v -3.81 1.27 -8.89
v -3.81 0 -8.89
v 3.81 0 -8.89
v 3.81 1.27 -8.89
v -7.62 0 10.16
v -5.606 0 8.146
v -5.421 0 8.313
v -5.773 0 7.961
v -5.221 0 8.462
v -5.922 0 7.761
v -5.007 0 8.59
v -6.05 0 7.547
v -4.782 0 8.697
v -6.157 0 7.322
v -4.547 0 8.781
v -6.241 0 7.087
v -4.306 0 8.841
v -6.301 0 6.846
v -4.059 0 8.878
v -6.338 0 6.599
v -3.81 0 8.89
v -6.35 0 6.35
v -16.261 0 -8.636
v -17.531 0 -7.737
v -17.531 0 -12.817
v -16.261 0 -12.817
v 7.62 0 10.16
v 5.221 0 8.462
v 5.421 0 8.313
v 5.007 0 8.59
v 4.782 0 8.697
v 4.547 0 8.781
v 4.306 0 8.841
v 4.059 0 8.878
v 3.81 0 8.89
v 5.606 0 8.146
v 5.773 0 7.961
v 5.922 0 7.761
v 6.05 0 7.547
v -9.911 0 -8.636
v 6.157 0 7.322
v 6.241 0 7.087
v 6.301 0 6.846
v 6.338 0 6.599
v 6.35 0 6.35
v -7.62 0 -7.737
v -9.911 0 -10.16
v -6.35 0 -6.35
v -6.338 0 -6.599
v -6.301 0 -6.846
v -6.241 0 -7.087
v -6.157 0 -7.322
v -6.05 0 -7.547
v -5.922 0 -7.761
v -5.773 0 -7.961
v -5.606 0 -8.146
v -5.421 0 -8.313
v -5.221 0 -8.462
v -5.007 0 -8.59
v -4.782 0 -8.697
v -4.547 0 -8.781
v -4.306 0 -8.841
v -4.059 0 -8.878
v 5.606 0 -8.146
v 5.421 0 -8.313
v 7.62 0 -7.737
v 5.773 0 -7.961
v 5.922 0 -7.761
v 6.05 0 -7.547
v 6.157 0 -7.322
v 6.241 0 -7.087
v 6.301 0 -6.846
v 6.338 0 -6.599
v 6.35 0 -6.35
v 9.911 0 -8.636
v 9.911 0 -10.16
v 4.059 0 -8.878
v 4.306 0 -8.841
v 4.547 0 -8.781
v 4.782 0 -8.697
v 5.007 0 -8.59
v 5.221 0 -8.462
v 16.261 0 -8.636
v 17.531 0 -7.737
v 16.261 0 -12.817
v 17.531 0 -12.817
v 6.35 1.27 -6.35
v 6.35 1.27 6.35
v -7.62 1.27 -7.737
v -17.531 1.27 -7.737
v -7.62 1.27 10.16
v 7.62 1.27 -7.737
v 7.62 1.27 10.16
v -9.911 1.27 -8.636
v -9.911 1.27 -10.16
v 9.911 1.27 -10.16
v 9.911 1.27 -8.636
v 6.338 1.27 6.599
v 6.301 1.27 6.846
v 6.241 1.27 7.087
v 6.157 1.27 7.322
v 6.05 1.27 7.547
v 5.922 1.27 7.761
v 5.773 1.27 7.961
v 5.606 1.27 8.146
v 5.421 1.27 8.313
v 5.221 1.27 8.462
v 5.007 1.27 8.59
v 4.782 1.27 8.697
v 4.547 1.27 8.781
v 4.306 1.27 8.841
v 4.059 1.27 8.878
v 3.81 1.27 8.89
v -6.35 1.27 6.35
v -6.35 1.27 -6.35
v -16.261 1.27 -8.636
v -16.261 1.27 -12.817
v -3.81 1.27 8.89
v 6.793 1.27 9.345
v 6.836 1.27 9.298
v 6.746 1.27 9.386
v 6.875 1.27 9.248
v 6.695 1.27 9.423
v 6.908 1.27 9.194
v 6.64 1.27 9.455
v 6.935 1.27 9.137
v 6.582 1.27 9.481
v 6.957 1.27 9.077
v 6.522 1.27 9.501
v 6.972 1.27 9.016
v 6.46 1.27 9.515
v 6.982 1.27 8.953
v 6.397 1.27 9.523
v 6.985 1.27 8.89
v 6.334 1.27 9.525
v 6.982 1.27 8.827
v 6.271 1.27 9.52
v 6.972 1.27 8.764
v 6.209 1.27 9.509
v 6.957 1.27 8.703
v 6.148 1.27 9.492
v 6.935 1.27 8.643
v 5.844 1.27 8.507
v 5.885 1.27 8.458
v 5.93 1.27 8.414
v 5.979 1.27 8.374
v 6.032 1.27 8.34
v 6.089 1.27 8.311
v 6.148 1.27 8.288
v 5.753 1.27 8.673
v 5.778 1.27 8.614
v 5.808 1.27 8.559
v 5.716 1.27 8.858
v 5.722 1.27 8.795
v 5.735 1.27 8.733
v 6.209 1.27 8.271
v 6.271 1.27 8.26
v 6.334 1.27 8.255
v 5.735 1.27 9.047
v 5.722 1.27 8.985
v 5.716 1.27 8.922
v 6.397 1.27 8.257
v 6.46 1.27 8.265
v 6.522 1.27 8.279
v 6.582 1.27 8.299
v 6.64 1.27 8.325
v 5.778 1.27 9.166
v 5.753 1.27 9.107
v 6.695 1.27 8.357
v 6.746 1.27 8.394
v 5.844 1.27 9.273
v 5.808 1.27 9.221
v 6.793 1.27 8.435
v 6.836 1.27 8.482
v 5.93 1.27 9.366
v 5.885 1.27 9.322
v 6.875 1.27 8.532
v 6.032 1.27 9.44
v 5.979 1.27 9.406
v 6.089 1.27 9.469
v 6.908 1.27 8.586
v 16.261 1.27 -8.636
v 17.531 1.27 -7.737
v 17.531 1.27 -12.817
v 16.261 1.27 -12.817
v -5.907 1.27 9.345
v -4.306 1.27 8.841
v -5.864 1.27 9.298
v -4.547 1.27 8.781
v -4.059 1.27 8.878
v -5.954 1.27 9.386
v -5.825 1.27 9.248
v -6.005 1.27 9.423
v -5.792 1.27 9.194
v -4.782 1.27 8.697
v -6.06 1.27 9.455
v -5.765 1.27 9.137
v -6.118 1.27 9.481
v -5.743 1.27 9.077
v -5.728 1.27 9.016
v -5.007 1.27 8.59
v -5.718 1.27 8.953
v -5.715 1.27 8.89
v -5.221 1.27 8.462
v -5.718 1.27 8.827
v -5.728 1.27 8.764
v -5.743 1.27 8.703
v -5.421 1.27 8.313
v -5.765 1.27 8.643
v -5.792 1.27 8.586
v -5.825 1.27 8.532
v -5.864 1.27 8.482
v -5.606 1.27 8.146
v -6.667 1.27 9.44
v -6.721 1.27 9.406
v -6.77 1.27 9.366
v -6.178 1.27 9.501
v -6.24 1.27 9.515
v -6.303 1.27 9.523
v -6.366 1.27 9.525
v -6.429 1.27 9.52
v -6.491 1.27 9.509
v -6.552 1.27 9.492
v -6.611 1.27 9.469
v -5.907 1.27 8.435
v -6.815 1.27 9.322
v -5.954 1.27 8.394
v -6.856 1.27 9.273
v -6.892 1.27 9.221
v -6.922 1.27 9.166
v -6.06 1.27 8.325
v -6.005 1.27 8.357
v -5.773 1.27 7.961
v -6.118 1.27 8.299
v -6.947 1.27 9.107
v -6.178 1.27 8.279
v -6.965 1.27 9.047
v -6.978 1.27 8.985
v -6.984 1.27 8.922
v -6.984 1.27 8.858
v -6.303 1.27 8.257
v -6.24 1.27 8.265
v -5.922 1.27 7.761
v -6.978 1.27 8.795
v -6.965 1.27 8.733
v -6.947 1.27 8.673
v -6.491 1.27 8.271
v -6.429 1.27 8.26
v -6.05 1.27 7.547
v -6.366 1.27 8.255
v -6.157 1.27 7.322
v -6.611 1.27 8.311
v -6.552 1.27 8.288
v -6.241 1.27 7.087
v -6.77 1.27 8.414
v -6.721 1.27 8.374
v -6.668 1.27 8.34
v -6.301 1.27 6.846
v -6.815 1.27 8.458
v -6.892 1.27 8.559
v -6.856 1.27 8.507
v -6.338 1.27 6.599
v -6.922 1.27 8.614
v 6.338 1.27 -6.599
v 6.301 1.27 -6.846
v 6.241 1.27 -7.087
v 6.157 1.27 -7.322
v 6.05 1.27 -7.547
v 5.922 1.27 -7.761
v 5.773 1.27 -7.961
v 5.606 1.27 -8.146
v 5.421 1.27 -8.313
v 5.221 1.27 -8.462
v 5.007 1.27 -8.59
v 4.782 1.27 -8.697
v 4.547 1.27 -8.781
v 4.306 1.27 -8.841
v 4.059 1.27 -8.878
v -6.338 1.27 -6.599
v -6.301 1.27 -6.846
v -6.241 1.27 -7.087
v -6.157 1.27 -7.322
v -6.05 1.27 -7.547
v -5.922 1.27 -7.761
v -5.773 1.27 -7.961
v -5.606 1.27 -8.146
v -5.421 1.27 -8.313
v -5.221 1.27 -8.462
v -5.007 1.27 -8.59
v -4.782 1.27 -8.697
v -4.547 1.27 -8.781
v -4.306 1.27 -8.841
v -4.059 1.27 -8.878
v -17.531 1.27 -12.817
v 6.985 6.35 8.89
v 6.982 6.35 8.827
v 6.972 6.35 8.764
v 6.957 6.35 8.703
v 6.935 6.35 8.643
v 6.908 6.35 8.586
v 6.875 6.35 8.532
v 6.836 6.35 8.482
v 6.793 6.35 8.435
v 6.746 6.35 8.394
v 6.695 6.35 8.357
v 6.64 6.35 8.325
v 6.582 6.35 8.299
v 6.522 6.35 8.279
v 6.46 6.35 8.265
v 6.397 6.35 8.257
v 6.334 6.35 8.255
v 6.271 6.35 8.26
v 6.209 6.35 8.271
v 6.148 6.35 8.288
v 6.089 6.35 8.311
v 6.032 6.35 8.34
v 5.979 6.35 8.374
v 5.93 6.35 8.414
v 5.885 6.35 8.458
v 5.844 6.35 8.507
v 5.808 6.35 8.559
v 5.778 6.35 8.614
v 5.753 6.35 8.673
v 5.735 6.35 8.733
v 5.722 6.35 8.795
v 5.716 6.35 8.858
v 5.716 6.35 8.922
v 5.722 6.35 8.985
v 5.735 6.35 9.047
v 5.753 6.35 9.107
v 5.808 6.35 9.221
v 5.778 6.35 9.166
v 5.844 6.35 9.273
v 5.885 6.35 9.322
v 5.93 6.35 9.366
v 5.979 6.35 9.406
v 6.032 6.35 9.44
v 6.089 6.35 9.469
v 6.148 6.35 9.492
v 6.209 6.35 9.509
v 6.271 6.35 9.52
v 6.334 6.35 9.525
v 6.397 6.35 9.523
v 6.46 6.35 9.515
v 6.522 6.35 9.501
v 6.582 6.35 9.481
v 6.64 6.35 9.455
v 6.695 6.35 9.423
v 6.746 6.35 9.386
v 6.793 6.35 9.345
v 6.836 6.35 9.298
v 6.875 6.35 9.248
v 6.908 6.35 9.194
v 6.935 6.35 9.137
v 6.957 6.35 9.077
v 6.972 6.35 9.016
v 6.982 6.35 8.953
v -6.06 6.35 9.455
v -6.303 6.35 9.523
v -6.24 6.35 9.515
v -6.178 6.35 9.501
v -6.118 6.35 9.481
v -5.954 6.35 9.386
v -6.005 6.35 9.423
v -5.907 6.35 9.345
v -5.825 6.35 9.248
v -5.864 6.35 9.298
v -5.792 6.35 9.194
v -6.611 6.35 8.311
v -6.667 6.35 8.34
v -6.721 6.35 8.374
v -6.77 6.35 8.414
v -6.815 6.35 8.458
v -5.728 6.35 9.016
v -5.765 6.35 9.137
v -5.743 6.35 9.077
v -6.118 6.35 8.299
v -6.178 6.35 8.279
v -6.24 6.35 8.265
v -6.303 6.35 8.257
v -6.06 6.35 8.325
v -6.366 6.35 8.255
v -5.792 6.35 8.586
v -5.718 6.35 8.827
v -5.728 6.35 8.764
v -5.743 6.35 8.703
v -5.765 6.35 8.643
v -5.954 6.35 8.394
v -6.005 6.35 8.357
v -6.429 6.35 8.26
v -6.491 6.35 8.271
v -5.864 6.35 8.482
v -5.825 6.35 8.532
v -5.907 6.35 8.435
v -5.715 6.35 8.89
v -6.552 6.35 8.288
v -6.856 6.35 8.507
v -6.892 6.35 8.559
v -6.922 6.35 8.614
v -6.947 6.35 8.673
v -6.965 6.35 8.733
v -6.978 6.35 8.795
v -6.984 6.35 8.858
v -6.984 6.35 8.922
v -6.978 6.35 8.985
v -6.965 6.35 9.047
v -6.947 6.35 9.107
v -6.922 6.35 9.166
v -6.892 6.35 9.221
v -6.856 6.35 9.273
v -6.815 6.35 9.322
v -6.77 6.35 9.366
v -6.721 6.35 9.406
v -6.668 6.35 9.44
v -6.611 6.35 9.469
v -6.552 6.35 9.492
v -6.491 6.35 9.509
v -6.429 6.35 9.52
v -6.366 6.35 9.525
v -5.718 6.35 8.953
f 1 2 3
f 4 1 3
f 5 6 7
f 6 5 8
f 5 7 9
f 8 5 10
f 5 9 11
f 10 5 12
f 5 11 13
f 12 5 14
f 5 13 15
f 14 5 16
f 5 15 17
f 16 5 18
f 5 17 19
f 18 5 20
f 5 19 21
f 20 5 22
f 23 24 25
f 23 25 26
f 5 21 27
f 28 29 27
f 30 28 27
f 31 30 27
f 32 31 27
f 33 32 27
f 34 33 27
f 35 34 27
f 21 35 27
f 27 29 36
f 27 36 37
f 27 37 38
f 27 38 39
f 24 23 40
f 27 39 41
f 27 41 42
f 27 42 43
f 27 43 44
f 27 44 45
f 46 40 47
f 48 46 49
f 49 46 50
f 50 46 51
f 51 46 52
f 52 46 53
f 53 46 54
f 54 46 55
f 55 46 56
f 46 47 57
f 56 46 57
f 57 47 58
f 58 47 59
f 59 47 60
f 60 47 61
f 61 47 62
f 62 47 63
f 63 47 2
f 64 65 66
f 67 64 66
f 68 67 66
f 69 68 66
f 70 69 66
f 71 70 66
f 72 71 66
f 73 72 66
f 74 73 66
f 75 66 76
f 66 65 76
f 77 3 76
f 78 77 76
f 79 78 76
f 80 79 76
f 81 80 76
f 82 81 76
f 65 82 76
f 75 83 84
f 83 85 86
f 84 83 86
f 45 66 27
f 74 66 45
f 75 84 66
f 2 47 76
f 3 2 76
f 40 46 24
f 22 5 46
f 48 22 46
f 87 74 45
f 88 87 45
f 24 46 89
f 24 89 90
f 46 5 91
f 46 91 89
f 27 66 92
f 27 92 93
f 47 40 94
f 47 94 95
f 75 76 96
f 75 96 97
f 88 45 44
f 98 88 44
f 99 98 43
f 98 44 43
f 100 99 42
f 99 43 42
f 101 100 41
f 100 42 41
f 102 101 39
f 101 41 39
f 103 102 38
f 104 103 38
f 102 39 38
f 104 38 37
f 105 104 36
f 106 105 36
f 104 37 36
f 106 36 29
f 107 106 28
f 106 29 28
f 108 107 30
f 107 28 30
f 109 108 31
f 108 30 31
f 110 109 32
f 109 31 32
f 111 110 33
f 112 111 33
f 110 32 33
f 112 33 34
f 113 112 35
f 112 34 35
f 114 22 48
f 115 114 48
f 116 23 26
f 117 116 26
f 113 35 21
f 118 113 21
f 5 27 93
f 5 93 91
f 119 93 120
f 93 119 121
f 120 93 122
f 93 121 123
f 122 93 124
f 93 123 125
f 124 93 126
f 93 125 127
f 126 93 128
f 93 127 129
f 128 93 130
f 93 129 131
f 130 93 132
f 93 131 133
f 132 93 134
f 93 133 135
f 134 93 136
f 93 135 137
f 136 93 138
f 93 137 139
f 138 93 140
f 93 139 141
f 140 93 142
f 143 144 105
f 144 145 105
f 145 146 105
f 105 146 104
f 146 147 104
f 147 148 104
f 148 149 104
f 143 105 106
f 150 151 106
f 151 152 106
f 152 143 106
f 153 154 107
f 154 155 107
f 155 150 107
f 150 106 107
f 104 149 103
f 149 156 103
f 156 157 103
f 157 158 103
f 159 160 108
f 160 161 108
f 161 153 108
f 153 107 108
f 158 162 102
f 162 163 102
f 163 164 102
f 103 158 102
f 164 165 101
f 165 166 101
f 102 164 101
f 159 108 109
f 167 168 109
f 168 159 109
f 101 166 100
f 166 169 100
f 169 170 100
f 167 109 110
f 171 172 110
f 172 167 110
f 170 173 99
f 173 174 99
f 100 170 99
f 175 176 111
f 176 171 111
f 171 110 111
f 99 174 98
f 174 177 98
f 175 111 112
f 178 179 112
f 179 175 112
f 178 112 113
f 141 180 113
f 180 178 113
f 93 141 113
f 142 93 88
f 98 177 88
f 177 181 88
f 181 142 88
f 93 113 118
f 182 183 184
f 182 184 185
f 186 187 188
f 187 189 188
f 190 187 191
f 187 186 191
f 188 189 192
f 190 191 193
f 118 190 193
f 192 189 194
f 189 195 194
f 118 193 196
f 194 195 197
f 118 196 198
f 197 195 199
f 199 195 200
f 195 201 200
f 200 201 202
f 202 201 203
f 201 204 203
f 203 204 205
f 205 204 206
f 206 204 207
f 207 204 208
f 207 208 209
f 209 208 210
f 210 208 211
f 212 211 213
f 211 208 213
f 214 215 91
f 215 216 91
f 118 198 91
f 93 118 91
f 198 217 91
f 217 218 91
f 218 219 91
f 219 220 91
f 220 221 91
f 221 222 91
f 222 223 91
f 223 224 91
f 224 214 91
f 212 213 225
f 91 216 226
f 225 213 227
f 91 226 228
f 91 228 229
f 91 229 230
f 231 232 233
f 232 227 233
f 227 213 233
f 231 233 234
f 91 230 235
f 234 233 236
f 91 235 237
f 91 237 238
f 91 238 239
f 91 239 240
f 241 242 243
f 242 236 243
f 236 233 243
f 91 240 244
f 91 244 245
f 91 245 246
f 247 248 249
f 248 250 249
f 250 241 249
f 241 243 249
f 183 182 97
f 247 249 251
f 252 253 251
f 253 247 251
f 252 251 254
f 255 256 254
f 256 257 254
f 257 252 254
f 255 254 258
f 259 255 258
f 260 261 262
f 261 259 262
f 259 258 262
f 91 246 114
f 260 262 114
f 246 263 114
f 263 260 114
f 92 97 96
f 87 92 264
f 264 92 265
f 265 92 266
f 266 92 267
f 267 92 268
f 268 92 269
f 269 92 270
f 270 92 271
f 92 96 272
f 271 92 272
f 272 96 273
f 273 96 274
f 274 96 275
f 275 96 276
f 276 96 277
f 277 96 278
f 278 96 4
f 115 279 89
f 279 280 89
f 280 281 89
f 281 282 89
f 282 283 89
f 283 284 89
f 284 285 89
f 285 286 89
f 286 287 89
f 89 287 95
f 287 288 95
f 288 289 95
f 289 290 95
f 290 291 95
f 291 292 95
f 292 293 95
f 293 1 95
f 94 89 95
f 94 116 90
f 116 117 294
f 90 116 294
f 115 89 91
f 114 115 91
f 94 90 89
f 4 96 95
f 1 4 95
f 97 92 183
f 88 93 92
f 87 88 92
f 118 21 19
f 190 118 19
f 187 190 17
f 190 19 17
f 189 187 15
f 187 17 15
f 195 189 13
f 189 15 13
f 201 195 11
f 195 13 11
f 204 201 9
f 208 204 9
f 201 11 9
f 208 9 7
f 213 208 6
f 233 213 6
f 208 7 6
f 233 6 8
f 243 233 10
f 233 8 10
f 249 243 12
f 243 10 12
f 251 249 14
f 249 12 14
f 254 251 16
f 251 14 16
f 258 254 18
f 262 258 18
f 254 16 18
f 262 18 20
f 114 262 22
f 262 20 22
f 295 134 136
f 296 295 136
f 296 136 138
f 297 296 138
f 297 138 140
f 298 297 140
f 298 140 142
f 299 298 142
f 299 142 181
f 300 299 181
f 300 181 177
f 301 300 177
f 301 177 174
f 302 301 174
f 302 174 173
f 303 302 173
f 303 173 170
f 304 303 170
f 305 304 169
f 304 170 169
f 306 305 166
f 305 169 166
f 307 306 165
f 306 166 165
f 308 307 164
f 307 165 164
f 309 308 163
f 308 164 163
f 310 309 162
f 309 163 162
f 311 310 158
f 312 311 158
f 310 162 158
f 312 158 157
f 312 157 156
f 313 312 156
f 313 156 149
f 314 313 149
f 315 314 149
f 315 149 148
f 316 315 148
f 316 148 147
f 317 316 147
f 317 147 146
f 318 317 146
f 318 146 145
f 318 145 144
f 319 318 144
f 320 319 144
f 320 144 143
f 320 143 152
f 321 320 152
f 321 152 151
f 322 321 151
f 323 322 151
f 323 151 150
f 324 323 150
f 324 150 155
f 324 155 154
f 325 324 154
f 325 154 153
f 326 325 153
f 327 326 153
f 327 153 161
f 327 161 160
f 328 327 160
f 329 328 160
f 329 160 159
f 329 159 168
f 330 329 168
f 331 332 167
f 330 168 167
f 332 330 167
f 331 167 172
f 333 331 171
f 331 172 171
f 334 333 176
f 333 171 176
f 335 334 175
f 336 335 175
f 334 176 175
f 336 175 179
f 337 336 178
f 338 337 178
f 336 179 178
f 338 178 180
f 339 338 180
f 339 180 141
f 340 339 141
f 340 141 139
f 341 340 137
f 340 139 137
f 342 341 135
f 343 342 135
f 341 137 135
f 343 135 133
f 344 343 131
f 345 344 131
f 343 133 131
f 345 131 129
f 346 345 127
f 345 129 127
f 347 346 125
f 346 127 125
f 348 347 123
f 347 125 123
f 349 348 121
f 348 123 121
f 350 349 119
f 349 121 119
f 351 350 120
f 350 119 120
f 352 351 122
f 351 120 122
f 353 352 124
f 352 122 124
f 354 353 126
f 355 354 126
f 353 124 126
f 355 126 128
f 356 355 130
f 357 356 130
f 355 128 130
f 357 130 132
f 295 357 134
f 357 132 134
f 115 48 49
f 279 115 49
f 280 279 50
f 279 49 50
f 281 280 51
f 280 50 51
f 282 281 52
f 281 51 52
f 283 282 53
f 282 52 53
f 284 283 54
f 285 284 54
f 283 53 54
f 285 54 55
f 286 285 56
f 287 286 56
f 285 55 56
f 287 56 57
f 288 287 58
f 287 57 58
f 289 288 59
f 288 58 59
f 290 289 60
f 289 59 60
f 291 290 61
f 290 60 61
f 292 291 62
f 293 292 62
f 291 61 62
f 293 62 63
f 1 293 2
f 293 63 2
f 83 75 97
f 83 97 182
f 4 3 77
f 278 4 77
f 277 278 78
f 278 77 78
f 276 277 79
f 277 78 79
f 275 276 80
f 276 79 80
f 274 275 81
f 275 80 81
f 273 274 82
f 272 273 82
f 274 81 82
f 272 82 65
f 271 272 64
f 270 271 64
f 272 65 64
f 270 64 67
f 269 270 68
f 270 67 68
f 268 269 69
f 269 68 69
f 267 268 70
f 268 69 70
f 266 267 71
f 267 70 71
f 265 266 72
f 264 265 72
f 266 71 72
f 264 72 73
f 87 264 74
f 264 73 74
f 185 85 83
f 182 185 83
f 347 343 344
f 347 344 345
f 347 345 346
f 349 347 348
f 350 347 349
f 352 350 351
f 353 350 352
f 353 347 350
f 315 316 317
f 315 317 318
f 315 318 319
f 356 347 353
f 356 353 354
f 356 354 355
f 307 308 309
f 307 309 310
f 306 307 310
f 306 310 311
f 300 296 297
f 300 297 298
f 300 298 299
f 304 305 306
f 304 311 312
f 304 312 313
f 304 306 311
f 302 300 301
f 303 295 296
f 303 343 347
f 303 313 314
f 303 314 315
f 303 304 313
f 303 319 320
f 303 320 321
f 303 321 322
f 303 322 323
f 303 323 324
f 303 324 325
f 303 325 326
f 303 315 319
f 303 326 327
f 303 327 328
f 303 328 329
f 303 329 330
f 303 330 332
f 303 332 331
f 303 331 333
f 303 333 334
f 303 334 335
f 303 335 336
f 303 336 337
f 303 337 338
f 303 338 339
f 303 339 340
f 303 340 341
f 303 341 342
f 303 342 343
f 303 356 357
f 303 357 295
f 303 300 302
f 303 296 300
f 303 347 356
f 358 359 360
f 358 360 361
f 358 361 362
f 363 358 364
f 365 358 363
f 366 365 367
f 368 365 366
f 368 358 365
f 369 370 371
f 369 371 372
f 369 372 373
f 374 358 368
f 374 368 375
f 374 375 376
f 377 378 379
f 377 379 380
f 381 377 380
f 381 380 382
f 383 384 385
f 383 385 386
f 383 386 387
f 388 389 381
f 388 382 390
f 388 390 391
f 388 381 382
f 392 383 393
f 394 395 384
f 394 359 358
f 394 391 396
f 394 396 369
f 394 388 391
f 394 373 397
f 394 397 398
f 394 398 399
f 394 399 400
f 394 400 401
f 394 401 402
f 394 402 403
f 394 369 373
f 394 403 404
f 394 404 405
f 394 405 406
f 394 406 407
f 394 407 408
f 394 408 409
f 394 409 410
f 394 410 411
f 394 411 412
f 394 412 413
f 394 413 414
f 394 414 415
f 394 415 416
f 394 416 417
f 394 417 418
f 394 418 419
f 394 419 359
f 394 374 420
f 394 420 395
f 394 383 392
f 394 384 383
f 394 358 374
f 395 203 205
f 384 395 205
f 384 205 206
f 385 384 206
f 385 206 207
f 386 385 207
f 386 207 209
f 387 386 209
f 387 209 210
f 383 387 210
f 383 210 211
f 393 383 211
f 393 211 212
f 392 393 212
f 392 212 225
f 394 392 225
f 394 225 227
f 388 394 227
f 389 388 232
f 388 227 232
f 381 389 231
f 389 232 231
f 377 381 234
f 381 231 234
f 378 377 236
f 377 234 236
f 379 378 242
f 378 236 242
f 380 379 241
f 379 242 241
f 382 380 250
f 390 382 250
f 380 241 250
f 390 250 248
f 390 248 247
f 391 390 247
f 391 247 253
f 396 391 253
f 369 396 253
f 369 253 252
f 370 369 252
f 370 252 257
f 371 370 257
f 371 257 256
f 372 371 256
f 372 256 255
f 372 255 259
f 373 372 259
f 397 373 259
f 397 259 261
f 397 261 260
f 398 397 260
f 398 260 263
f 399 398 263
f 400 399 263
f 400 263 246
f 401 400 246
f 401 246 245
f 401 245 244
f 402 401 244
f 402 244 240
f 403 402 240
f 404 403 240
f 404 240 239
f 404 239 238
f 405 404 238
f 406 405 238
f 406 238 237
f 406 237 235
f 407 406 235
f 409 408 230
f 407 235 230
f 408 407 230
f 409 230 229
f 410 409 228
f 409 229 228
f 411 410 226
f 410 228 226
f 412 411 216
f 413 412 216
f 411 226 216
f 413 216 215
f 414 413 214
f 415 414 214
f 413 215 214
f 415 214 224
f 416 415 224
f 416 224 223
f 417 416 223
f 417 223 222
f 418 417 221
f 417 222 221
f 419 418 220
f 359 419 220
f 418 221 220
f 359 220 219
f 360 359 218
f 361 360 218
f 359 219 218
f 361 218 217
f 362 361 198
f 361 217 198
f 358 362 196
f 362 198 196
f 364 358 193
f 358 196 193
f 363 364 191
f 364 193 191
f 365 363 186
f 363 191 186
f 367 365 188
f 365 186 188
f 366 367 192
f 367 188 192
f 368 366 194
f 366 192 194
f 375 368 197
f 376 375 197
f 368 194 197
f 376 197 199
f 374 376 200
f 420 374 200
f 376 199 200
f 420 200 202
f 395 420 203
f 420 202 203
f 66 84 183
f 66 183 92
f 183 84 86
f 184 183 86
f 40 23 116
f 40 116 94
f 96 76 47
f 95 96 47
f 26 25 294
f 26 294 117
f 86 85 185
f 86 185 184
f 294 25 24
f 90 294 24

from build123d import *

# Parameters (mm, degrees)
BOSS_EXTRUDE2_DEPTH     = 1.27
SKETCH3_R               = 0.635
BOSS_EXTRUDE3_DEPTH     = 6.35
CUT_EXTRUDE1_DEPTH      = 6.35
CUT_EXTRUDE1_DEPTH_BACK = 6.35


with BuildPart() as part:
    # Sketch1 → Boss-Extrude2 (new body)
    with BuildSketch(Plane(origin=(0, 0, 0), x_dir=(1, 0, 0), z_dir=(0, 1, 0))):
        Polygon((7.62, -10.16), (-7.62, -10.16), (-7.62, 7.736503278), (-17.531075881, 7.736503278), (-17.531075881, 10.276503278), (-17.531075881, 12.816503278), (-16.261075881, 12.816503278), (-16.261075881, 10.16), (-16.261075881, 8.636), (-9.911075881, 8.636), (-9.911075881, 10.16), (-7.62, 10.16), (7.62, 10.16), (9.911075881, 10.16), (9.911075881, 8.636), (16.261075881, 8.636), (16.261075881, 10.16), (16.261075881, 12.816503278), (17.531075881, 12.816503278), (17.531075881, 10.276503278), (17.531075881, 7.736503278), (7.62, 7.736503278), align=None)
    extrude(amount=BOSS_EXTRUDE2_DEPTH)

    # Sketch3 → Boss-Extrude3 (add)
    with BuildSketch(Plane(origin=(0, 0, 0), x_dir=(1, 0, 0), z_dir=(0, 1, 0))):
        with Locations((-6.35, -8.89)):
            Circle(SKETCH3_R)
        with Locations((6.35, -8.89)):
            Circle(SKETCH3_R)
    extrude(amount=BOSS_EXTRUDE3_DEPTH)

    # Sketch4 → Cut-Extrude1 (cut, two sides)
    with BuildSketch(Plane(origin=(0, 0, 0), x_dir=(1, 0, 0), z_dir=(0, 1, 0))) as cut_extrude1_sk:
        with BuildLine():
            Line((3.81, -8.89), (-3.81, -8.89))
            ThreePointArc((-3.81, -8.89), (-5.606051224, -8.146051224), (-6.35, -6.35))
            Line((-6.35, -6.35), (-6.35, 6.35))
            ThreePointArc((-6.35, 6.35), (-5.606051224, 8.146051224), (-3.81, 8.89))
            Line((-3.81, 8.89), (3.81, 8.89))
            ThreePointArc((3.81, 8.89), (5.606051224, 8.146051224), (6.35, 6.35))
            Line((6.35, 6.35), (6.35, -6.35))
            ThreePointArc((6.35, -6.35), (5.606051224, -8.146051224), (3.81, -8.89))
        make_face()
    extrude(amount=CUT_EXTRUDE1_DEPTH, mode=Mode.SUBTRACT)
    extrude(cut_extrude1_sk.sketch, amount=-CUT_EXTRUDE1_DEPTH_BACK, mode=Mode.SUBTRACT)


solid = part.part
